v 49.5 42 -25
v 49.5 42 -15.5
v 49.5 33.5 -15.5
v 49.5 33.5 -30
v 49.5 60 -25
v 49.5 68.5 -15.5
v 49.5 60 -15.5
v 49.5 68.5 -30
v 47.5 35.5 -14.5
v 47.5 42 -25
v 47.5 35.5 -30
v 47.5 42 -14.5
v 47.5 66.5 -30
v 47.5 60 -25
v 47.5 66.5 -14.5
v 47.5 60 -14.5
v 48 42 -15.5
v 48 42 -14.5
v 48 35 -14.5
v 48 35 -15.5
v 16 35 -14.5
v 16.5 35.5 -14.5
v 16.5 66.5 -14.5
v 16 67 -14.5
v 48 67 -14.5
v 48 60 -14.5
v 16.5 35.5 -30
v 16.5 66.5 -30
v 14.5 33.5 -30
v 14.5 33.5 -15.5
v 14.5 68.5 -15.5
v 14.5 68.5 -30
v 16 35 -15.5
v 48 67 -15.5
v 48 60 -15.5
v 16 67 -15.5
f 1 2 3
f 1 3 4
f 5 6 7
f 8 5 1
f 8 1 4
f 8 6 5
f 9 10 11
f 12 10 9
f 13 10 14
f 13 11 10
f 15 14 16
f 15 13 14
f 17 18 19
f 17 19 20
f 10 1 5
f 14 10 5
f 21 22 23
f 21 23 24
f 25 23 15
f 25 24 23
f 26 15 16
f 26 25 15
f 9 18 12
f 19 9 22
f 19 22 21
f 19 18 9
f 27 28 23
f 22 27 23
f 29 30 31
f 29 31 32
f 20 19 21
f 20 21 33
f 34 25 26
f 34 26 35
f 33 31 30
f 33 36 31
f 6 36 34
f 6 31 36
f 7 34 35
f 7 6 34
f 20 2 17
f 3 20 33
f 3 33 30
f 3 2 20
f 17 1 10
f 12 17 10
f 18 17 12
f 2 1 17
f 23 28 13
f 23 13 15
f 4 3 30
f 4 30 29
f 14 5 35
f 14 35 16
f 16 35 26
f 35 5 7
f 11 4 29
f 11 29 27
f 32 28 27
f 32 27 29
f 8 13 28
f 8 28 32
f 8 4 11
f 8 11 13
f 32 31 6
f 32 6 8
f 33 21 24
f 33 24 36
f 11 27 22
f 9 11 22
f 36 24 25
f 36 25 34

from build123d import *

# Parameters (mm, degrees)
SKETCH123_W      = 18
SKETCH123_H      = 13
EXTRUDE112_DEPTH = 5


with BuildPart() as extrude112:
    # Sketch123 → Extrude112 (new body)
    with BuildSketch(Plane.YZ.offset(50)):
        with Locations((51, -18.5)):
            Rectangle(SKETCH123_W, SKETCH123_H)
    extrude(amount=-EXTRUDE112_DEPTH)


with BuildPart() as cut019:
    # Sweep: sweep along a path in Sketch090
    with BuildLine(Plane(origin=(0, 0, -28), x_dir=(1, 0, 0), z_dir=(0, 0, -1))) as sweep_path:
        Line((16.5, -35.5), (47.5, -35.5))
        Line((47.5, -35.5), (47.5, -66.5))
        Line((47.5, -66.5), (16.5, -66.5))
        Line((16.5, -66.5), (16.5, -35.5))
    # Sketch089 → Sweep (sweep)
    with BuildSketch(Plane.XZ.offset(-34)):
        Polygon((16, -14.5), (16.5, -14.5), (16.5, -30), (14.5, -30), (14.5, -15.5), (16, -15.5), align=None)
    sweep(path=sweep_path.line, transition=Transition.RIGHT)

    # Cut019: cut Extrude112
    add(extrude112.part, mode=Mode.SUBTRACT)


solid = cut019.part
